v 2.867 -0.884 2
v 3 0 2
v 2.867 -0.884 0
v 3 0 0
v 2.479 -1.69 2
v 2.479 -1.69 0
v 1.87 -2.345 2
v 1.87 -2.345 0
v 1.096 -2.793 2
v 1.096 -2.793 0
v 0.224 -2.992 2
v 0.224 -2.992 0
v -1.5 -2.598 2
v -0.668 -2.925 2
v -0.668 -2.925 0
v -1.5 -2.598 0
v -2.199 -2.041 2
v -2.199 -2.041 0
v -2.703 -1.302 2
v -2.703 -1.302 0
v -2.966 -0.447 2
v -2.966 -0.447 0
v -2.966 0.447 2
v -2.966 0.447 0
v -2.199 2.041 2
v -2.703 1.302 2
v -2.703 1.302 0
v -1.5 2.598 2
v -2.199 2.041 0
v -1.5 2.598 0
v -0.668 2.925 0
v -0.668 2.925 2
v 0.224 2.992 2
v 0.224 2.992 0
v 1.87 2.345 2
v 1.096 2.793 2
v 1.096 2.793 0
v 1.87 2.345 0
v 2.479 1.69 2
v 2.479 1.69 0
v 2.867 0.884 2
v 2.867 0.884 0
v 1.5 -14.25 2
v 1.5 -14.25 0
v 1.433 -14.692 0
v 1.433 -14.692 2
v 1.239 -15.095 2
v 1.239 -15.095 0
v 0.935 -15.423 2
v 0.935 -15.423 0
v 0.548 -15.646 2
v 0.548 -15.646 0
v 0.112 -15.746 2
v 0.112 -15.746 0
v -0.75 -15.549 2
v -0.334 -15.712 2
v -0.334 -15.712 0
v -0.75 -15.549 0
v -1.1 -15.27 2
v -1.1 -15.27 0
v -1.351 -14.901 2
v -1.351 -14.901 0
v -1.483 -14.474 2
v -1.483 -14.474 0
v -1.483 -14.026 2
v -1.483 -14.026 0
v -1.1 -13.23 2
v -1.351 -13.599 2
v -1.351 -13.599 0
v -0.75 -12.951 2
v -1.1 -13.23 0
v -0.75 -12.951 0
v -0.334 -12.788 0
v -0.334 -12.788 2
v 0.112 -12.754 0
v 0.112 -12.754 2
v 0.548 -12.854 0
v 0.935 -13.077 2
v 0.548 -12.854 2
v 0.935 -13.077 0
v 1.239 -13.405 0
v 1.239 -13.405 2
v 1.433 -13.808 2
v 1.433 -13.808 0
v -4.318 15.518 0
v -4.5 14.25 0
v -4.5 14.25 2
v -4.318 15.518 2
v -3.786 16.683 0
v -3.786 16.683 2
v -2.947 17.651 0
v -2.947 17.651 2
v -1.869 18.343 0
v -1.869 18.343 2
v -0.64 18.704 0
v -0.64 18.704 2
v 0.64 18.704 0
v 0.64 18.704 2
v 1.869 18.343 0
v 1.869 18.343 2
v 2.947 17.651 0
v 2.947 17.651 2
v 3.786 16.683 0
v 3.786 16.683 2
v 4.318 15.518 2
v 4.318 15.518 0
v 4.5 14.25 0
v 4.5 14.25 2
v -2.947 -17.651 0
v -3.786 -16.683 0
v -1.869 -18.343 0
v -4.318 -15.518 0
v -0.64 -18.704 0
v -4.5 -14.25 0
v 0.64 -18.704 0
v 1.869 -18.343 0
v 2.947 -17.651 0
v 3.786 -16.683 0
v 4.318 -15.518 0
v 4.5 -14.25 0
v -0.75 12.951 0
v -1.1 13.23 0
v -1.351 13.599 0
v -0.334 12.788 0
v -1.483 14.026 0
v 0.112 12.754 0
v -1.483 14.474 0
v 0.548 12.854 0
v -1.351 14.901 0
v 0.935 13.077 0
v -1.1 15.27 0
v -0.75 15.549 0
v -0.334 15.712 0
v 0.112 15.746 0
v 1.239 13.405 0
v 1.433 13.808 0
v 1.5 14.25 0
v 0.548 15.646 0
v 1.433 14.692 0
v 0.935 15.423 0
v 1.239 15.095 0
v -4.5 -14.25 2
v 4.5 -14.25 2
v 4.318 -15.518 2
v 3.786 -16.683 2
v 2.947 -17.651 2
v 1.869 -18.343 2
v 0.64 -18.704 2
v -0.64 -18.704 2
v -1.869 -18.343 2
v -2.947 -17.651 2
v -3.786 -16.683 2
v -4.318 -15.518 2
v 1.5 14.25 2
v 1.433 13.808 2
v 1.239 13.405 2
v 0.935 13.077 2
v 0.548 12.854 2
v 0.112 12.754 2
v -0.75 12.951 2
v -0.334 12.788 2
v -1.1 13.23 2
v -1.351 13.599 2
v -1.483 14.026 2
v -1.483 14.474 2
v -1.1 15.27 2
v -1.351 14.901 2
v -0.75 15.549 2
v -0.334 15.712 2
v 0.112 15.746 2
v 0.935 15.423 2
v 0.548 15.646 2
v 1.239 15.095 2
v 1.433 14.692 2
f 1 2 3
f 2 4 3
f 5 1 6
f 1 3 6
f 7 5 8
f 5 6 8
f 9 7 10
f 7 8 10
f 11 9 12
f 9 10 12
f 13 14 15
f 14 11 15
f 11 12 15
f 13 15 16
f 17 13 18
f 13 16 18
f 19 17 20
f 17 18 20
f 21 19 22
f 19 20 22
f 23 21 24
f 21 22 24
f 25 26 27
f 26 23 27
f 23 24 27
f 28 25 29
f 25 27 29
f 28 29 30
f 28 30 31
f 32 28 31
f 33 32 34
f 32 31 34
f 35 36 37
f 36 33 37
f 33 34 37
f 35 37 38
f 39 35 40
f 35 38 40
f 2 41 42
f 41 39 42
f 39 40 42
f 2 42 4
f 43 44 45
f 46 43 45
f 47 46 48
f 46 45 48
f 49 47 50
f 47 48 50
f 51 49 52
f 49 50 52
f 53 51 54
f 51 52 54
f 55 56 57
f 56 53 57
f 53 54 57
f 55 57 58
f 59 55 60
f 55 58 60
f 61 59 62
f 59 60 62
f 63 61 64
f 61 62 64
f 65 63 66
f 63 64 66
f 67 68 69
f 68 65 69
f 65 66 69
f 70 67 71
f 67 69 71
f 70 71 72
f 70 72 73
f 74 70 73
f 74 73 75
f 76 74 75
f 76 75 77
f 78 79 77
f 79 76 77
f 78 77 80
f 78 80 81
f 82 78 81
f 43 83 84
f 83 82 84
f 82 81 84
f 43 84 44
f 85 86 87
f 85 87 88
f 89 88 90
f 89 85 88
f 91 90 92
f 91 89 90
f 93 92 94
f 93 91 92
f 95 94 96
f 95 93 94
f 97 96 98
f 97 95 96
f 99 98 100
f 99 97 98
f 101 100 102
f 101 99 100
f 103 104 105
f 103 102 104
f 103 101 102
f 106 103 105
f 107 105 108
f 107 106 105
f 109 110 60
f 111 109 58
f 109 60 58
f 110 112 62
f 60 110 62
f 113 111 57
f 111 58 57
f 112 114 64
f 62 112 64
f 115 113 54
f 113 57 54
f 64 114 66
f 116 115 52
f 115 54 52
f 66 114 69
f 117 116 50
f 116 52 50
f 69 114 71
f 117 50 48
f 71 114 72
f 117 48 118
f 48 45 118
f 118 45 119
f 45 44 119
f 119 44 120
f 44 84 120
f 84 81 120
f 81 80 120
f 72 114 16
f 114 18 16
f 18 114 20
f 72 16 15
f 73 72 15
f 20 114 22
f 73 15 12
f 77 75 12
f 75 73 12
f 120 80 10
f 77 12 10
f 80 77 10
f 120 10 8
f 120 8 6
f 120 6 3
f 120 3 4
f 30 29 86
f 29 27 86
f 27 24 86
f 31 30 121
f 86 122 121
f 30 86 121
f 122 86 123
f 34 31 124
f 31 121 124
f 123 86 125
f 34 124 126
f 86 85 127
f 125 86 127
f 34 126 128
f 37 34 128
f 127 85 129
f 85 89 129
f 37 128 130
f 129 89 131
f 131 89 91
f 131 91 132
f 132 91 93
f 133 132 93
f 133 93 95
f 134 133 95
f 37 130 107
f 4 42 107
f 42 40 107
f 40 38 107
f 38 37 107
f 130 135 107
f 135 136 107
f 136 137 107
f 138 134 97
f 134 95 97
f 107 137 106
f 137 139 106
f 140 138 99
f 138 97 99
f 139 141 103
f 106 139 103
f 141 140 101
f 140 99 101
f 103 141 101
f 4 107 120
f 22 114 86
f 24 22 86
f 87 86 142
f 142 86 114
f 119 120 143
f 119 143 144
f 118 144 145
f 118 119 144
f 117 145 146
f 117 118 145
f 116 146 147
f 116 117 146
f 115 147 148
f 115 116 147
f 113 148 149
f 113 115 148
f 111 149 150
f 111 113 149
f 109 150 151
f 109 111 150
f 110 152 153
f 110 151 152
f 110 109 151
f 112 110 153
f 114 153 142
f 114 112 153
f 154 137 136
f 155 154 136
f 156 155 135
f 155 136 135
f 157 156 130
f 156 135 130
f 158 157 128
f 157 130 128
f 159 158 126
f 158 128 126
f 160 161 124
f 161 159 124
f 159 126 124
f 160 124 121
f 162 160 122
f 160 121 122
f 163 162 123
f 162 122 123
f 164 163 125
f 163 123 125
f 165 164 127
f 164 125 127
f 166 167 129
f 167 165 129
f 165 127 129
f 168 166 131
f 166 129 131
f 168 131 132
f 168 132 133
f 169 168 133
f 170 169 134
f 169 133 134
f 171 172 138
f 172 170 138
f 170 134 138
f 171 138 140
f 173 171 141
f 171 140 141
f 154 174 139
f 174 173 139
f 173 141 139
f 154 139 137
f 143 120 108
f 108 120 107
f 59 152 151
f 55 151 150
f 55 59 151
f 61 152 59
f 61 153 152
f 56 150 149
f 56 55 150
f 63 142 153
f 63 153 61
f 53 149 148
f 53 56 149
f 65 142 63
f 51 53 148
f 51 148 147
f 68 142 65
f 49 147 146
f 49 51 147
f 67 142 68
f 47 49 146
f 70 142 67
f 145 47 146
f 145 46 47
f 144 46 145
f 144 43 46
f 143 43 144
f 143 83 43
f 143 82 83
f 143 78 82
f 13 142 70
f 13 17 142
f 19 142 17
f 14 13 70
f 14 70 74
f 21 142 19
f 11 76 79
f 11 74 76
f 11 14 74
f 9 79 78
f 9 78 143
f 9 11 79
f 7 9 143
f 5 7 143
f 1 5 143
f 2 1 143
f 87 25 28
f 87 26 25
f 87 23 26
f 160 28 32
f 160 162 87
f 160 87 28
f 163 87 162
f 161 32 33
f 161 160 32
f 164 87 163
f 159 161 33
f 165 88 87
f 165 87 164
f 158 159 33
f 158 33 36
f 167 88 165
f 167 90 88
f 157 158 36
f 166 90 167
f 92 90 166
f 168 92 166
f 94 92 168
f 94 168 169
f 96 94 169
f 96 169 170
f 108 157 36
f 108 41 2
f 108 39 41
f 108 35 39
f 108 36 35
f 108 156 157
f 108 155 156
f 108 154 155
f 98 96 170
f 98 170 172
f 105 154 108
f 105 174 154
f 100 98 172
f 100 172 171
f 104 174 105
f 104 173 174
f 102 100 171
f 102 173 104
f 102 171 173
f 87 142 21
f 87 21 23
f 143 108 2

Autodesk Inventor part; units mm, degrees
ref_plane "YZ Plane" through (0, 0, 0) normal (1, 0, 0) x (0, 1, 0)
ref_plane "XZ Plane" through (0, 0, 0) normal (0, 1, 0) x (-1, 0, 0)
ref_plane "XY Plane" through (0, 0, 0) normal (0, 0, 1) x (1, 0, 0)
sketch "Skizze1" plane through (0, 0, 0) normal (0, 0, 1) x (1, 0, 0)
  line L0 (0, -14.25) -> (0, 14.25) construction
  line L1 (4.5, -14.25) -> (4.5, 14.25)
  line L2 (-4.5, 14.25) -> (-4.5, -14.25)
  arc A0 (-4.5, -14.25) -> (4.5, -14.25) centre (0, -14.25) ccw
  arc A1 (4.5, 14.25) -> (-4.5, 14.25) centre (0, 14.25) ccw
  line L3 (0, 28.35) -> (0, -28.35) construction
  line L4 (-8.4, 0) -> (8.4, 0) construction
  circle A2 centre (0, 14.25) radius 1.5
  circle A3 centre (0, -14.25) radius 1.5
  circle A4 centre (0, 0) radius 3
  circle A5 centre (0, 14.25) radius 6 construction
  circle A6 centre (0, -14.25) radius 6 construction
  line L5 (0, 20.25) -> (0, -20.25) construction
  dimension "d4" = 12
  dimension "d1" = 3
  dimension "d2" = 3
  dimension "d3" = 6
  dimension "d5" = 40.5
extrude "Extrusion1" add sketch "Skizze1" along normal blind 2
properties part number "HarmonicDrive-WaveGenerator"
